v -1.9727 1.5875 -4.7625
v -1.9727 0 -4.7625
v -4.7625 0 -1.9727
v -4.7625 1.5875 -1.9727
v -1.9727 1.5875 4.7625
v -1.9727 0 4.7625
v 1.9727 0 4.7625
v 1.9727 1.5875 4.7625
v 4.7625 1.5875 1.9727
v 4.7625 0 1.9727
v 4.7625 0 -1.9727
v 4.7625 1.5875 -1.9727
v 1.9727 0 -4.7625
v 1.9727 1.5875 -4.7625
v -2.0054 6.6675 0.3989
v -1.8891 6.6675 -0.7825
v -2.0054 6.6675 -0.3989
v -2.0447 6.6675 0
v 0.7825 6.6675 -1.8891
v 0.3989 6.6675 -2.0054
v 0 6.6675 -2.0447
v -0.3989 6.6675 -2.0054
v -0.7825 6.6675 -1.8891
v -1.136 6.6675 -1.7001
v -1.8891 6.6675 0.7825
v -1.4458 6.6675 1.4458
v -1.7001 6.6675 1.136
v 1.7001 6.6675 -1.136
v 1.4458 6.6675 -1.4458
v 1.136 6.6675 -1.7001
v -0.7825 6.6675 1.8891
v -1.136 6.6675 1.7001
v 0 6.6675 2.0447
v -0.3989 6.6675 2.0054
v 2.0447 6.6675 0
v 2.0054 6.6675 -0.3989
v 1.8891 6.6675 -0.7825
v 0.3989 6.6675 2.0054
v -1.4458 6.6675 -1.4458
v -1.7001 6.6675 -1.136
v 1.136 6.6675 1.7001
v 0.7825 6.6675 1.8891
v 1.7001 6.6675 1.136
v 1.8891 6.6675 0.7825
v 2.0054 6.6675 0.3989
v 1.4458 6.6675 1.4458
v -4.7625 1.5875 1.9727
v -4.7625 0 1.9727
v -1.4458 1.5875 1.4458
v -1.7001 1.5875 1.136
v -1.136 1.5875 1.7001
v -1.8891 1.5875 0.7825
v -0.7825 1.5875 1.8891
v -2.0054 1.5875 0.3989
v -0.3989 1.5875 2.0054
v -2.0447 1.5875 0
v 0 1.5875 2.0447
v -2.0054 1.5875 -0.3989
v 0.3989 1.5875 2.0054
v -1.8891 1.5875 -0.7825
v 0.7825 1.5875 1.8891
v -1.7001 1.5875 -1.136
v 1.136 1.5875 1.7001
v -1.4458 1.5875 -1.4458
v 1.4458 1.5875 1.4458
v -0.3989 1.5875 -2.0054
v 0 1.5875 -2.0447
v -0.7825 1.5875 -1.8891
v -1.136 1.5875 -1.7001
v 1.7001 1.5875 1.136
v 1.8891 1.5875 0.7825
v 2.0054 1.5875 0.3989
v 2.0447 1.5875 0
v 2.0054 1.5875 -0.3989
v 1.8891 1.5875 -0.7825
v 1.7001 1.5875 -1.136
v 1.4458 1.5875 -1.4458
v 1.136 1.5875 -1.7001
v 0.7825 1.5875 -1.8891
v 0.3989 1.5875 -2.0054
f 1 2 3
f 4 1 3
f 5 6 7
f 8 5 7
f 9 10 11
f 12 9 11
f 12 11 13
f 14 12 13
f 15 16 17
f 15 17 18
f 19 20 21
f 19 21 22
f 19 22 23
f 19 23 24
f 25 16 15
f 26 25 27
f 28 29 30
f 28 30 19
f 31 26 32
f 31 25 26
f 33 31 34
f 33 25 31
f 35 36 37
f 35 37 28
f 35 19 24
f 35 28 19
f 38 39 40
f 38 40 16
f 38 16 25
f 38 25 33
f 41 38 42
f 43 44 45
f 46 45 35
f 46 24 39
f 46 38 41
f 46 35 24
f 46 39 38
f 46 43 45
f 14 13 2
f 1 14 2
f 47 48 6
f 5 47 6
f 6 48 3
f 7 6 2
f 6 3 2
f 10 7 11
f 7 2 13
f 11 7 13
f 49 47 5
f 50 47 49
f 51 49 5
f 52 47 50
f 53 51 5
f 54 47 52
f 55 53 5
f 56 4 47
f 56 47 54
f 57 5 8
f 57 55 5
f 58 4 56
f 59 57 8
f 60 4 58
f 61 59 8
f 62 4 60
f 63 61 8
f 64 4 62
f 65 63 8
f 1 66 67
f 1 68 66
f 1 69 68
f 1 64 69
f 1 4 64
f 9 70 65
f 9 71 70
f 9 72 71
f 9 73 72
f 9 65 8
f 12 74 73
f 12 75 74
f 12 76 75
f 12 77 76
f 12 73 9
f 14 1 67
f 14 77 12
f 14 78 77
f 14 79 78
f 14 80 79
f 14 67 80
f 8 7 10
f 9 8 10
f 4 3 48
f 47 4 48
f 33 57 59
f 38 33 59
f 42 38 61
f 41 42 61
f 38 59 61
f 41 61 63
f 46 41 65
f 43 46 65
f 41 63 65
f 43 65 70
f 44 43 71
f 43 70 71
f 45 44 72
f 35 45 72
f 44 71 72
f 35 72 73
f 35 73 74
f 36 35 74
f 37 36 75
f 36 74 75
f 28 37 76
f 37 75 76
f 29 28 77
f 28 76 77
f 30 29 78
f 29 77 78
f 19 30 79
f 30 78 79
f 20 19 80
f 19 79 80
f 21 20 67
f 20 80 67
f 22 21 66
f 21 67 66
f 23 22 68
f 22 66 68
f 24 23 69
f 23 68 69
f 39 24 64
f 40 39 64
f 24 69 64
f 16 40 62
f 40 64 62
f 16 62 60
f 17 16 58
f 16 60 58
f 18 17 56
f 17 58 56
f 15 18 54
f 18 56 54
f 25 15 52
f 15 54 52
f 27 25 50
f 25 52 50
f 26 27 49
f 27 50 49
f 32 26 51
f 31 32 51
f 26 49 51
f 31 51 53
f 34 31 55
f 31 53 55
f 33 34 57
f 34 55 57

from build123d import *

# Parameters (mm, degrees)
BOSS_EXTRUDE1_DEPTH = 1.5875
SKETCH2_R           = 2.0447
BOSS_EXTRUDE3_DEPTH = 5.08


with BuildPart() as part:
    # Sketch1 → Boss-Extrude1 (new body)
    with BuildSketch(Plane(origin=(0, 0, 0), x_dir=(1, 0, 0), z_dir=(0, 1, 0))):
        Polygon((4.7625, -1.972692091), (4.7625, 1.972692091), (1.972692091, 4.7625), (-1.972692091, 4.7625), (-4.7625, 1.972692091), (-4.7625, -1.972692091), (-1.972692091, -4.7625), (1.972692091, -4.7625), align=None)
    extrude(amount=BOSS_EXTRUDE1_DEPTH)

    # Sketch2 → Boss-Extrude3 (add)
    with BuildSketch(Plane(origin=(0, 1.5875, 0), x_dir=(1, 0, 0), z_dir=(0, 1, 0))):
        with Locations(Location((0, 0, 0), (0, 0, 270))):
            Circle(SKETCH2_R)
    extrude(amount=BOSS_EXTRUDE3_DEPTH)


solid = part.part
